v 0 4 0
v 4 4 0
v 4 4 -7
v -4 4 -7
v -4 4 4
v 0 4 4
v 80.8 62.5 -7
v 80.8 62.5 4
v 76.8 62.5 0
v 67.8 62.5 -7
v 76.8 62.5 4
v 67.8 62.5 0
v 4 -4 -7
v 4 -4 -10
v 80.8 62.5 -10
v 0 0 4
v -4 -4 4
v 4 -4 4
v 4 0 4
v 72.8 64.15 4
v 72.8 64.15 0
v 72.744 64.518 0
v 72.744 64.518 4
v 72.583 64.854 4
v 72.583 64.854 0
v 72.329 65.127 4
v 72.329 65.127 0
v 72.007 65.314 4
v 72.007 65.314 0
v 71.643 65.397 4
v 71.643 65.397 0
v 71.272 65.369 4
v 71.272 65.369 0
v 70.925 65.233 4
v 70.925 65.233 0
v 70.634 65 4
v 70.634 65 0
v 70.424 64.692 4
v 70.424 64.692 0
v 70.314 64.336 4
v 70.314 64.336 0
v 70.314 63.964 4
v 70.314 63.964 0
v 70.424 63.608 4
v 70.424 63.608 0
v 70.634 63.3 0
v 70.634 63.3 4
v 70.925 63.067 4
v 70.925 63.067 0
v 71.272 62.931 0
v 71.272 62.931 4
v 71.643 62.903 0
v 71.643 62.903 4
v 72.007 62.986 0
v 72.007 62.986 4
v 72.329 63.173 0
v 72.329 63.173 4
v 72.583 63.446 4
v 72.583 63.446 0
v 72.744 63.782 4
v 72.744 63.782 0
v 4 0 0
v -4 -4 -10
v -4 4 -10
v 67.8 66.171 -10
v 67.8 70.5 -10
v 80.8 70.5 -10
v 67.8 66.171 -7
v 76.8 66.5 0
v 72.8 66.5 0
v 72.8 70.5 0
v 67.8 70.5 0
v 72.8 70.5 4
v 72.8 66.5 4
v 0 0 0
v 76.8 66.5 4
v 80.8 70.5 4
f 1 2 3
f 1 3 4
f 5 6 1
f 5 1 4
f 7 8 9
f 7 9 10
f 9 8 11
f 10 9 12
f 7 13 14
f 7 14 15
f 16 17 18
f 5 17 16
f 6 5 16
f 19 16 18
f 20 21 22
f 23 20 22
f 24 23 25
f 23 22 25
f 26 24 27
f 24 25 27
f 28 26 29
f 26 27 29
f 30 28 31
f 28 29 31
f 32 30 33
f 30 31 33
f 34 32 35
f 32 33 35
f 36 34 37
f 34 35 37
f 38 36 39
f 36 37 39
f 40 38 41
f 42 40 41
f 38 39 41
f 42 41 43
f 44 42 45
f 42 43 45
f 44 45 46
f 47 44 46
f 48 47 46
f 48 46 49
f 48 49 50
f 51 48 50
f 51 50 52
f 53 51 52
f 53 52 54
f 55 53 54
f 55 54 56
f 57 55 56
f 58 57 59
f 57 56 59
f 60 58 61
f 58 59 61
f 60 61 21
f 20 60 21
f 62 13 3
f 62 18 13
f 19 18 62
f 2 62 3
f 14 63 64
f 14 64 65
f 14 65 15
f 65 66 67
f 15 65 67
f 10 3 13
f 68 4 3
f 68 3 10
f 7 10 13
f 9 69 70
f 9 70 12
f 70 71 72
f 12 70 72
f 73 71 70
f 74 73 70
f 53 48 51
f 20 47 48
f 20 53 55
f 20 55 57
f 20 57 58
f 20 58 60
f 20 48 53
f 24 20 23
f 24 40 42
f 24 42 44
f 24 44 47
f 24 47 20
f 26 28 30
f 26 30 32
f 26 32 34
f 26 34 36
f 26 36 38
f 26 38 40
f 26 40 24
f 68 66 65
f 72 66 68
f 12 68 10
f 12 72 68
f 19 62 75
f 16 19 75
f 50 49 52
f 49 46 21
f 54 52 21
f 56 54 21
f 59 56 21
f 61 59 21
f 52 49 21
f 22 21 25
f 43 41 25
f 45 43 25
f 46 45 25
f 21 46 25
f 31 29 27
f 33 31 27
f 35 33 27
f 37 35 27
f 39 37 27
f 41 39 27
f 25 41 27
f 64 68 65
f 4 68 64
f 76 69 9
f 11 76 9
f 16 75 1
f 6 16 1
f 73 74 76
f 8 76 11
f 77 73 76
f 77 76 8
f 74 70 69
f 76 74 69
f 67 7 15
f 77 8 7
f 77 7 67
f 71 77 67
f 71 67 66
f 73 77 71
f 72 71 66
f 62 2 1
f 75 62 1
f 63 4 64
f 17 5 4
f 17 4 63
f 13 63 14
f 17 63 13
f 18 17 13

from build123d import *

# Parameters (mm, degrees)
BOSS_EXTRUDE1_DEPTH   = 4
BOSS_EXTRUDE1_2_DEPTH = 4
SKETCH2_W             = 13
SKETCH2_H             = 8
SKETCH2_W_2           = 8
BOSS_EXTRUDE2_DEPTH   = 7
BOSS_EXTRUDE3_DEPTH   = 3
SKETCH4_R             = 1.25
BOSS_EXTRUDE4_DEPTH   = 4


with BuildPart() as part:
    # Sketch1 → Boss-Extrude1 (new body)
    with BuildSketch(Plane.XY):
        Polygon((0, 0), (0, 4), (-4, 4), (-4, -4), (4, -4), (4, 0), align=None)
    extrude(amount=BOSS_EXTRUDE1_DEPTH)



with BuildPart() as body_2:
    # Sketch1 → Boss-Extrude1 2 (new body)
    with BuildSketch(Plane.XY):
        Polygon((76.8, 66.5), (76.8, 62.5), (80.8, 62.5), (80.8, 70.5), (72.8, 70.5), (72.8, 66.5), align=None)
    extrude(amount=BOSS_EXTRUDE1_2_DEPTH)


with BuildPart() as part_1:
    add(part.part)

    add(body_2.part)  # Boss-Extrude2 merges body 2
    # Sketch2 → Boss-Extrude2 (add)
    with BuildSketch(Plane(origin=(0, 0, 0), x_dir=(-1, 0, 0), z_dir=(0, 0, -1))):
        with Locations((-74.3, 66.5)):
            Rectangle(SKETCH2_W, SKETCH2_H)
        Rectangle(SKETCH2_W_2, SKETCH2_H)
    extrude(amount=BOSS_EXTRUDE2_DEPTH)

    # Sketch3 → Boss-Extrude3 (add)
    with BuildSketch(Plane(origin=(0, 0, -7), x_dir=(-1, 0, 0), z_dir=(0, 0, -1))):
        Polygon((4, 4), (4, -4), (-4, -4), (-80.8, 62.5), (-80.8, 70.5), (-67.8, 70.5), (-67.8, 66.170572917), align=None)
    extrude(amount=BOSS_EXTRUDE3_DEPTH)


with BuildPart() as body_2_2:
    # Sketch4 → Boss-Extrude4 (new body)
    with BuildSketch(Plane.XY):
        with Locations((71.55, 64.15)):
            Circle(SKETCH4_R)
    extrude(amount=BOSS_EXTRUDE4_DEPTH)


solid = Compound([part_1.part, body_2_2.part])
